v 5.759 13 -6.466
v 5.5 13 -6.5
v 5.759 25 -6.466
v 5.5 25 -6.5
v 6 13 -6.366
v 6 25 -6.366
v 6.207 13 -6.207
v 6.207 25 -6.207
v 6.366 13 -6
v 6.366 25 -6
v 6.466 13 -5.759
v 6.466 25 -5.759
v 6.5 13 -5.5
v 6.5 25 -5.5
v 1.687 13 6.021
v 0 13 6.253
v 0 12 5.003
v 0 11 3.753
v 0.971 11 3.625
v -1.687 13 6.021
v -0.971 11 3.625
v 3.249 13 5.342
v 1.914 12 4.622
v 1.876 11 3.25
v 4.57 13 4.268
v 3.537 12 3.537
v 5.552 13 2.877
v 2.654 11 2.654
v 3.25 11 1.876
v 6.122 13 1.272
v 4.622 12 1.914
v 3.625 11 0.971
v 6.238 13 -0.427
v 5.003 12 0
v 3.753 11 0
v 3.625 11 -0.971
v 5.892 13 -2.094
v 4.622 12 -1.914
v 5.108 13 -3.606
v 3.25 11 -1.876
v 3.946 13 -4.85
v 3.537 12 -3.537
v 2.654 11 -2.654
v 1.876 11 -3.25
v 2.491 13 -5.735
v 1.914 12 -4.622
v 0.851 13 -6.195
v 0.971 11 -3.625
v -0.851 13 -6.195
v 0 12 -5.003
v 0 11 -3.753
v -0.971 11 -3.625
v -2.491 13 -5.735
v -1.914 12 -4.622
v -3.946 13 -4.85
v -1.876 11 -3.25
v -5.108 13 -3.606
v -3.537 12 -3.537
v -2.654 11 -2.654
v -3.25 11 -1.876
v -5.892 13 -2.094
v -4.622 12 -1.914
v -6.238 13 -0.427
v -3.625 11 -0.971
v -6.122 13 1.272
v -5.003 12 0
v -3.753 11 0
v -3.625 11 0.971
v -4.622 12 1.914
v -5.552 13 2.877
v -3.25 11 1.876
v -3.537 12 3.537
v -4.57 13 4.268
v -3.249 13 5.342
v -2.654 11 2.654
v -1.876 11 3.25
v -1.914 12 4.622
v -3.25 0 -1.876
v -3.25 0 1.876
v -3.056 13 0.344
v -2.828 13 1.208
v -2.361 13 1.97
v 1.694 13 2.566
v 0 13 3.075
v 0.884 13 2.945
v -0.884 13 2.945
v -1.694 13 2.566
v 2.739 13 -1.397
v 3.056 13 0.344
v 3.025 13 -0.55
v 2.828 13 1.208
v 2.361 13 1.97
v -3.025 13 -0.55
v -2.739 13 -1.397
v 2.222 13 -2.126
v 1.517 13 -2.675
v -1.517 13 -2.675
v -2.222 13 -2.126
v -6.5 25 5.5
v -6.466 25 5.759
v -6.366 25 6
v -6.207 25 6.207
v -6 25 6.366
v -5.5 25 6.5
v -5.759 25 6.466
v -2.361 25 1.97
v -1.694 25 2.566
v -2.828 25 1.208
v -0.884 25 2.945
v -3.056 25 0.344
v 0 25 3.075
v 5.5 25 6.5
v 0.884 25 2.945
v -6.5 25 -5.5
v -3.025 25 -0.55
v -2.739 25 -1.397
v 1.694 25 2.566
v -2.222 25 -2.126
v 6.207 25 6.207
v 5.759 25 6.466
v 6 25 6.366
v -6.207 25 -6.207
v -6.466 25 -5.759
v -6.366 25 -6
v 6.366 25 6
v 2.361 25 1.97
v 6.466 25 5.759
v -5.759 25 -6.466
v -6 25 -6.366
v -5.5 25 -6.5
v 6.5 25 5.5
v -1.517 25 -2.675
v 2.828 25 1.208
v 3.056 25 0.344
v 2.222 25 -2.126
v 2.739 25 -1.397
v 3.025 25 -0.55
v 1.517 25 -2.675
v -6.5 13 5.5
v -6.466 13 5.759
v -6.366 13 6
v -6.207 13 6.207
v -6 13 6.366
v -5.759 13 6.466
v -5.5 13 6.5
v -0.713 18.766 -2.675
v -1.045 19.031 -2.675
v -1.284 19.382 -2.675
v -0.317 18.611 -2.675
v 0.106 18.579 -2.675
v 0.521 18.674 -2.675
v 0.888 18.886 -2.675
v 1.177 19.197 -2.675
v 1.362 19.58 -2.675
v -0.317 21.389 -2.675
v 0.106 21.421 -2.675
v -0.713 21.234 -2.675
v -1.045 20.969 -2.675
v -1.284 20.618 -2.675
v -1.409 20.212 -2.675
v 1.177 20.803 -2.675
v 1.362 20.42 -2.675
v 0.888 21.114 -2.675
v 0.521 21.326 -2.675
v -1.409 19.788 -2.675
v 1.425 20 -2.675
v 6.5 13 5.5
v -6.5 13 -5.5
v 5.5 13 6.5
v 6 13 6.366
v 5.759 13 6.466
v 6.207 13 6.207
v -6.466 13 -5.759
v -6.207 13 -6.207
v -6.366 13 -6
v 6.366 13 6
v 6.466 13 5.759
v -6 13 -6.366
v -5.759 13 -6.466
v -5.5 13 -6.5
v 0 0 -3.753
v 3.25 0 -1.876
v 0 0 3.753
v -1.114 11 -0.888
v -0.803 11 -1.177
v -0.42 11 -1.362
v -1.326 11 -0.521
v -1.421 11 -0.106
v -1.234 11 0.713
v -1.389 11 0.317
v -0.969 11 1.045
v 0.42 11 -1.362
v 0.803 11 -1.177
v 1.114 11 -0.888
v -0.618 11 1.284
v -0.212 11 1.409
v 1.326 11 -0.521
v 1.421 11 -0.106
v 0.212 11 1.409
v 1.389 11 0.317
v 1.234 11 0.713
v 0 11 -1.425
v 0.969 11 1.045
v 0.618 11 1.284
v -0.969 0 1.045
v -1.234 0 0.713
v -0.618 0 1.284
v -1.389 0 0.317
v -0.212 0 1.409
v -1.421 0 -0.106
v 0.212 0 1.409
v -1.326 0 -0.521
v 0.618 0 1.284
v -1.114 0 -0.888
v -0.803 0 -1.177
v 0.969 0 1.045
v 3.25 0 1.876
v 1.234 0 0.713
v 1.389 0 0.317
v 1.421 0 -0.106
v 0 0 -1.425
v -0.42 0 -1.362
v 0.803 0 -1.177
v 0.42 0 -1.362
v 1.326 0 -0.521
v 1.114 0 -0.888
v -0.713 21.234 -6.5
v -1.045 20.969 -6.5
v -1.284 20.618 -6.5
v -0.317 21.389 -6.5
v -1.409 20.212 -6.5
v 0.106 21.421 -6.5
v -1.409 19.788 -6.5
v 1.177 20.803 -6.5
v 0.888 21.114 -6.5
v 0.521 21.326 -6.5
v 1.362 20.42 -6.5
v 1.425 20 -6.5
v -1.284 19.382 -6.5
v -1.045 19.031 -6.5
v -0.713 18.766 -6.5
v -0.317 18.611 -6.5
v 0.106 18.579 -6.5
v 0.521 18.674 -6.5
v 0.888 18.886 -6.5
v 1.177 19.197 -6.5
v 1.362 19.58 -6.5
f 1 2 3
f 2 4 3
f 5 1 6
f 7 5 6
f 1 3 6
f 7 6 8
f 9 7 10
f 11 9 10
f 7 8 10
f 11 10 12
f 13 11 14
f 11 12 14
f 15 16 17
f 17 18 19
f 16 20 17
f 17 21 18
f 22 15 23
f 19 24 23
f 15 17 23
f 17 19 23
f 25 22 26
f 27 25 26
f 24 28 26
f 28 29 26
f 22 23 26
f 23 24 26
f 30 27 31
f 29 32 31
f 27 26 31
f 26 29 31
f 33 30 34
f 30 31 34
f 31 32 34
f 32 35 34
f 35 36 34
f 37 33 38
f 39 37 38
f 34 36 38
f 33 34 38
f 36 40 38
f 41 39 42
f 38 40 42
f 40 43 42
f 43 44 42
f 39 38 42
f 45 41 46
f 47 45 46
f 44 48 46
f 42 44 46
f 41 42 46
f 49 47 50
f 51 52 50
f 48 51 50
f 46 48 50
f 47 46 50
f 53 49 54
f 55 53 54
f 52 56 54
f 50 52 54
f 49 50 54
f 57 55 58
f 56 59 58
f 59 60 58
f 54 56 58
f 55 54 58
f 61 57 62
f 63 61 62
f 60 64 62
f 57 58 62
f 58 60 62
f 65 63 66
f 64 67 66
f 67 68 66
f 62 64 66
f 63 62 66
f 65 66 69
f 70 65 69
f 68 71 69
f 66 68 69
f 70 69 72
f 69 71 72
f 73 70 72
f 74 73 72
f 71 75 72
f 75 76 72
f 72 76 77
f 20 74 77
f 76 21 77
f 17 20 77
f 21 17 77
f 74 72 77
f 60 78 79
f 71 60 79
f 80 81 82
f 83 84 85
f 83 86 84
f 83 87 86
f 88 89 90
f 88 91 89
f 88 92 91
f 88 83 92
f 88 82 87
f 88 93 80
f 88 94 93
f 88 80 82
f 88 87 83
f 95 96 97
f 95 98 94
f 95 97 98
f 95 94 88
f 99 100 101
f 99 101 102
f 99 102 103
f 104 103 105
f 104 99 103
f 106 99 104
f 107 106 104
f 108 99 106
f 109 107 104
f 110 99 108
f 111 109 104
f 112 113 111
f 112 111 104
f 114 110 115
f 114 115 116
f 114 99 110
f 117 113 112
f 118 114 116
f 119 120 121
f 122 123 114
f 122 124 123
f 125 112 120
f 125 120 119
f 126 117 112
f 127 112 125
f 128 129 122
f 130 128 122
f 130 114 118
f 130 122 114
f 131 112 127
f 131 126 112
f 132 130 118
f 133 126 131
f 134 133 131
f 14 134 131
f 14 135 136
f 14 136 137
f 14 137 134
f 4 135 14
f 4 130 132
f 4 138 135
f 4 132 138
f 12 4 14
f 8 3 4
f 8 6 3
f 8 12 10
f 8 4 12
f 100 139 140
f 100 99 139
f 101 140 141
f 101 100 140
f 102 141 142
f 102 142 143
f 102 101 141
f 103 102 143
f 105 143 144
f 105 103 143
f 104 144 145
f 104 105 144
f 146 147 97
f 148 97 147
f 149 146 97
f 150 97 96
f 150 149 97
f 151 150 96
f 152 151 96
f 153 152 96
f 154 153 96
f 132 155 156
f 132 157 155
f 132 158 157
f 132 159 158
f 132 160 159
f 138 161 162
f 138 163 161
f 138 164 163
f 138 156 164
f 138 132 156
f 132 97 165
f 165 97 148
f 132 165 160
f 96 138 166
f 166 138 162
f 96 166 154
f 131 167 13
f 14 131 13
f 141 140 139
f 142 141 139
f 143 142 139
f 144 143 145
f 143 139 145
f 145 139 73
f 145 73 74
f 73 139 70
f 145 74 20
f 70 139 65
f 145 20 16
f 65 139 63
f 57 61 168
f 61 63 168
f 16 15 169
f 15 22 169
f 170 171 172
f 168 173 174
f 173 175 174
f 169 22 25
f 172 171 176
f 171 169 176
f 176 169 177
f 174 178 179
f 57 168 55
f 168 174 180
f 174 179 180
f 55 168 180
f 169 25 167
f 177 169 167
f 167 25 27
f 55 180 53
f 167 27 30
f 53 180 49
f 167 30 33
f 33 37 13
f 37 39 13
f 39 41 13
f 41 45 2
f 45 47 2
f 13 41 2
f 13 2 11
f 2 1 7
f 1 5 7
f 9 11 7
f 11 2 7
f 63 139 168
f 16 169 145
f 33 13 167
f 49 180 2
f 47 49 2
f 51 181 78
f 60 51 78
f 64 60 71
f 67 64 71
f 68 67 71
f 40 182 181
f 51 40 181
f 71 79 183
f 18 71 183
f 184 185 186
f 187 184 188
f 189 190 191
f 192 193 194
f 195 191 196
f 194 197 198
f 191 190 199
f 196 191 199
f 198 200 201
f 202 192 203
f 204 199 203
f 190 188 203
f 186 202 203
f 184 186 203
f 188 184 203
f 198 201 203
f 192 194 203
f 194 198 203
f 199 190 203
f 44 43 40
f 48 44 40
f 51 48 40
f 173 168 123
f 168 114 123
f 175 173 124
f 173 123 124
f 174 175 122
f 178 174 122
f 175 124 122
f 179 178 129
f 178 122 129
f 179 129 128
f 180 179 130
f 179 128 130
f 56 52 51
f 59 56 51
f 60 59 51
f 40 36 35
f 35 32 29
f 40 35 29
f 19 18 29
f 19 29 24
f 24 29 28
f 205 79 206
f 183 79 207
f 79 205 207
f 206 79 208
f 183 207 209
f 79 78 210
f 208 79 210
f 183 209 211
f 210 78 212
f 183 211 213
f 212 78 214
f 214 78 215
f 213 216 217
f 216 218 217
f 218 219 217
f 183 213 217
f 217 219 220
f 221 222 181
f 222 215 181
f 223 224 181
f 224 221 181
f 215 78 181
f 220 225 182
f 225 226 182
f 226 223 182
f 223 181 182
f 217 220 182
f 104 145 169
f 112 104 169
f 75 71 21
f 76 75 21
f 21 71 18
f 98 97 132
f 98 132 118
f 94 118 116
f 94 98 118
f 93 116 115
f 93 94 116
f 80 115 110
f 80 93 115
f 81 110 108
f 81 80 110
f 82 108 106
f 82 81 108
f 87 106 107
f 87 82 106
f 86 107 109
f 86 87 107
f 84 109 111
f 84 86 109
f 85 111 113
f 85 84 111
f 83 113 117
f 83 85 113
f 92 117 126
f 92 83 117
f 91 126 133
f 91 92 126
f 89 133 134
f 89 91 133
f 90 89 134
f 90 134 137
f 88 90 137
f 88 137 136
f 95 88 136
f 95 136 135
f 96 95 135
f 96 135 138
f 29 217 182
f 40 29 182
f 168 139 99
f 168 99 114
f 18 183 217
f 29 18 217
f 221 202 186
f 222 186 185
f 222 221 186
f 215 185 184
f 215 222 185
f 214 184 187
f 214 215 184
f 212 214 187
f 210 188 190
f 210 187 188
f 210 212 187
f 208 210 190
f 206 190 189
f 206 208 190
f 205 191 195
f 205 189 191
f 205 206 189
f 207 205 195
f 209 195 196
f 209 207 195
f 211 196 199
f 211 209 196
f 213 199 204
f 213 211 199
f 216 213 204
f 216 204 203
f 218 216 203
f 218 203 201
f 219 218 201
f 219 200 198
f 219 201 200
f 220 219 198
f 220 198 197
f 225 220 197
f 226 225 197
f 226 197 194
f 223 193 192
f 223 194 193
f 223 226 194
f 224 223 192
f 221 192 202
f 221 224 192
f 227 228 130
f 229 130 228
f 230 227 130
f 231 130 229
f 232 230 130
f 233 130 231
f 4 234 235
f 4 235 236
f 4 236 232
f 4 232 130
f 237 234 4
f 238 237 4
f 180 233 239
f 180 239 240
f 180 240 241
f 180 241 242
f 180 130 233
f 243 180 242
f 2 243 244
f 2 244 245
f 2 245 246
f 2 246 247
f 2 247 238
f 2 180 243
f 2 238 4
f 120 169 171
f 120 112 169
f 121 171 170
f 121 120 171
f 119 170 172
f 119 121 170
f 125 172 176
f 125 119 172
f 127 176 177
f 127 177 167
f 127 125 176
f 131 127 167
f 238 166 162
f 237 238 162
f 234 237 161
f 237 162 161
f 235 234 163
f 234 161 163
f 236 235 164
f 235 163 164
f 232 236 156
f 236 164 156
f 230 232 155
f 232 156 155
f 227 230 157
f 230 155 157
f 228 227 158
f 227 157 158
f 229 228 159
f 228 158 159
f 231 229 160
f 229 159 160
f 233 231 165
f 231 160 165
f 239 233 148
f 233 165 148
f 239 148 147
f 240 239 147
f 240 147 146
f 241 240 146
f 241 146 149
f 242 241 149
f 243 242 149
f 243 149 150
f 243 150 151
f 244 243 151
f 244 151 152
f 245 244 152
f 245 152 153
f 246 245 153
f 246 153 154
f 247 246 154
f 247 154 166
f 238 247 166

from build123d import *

# Parameters (mm, degrees)
SKETCH1_R           = 1.425
BOSS_EXTRUDE1_DEPTH = 13
SKETCH2_W           = 13
SKETCH2_H           = 13
SKETCH2_R           = 3.075
BOSS_EXTRUDE2_DEPTH = 12
BOSS_EXTRUDE3_REACH = 28.636
SKETCH5_R           = 1.425
CUT_EXTRUDE1_DEPTH  = 12
FILLET2_R           = 1


with BuildPart() as part:
    # Sketch1 → Boss-Extrude1 (new body)
    with BuildSketch(Plane(origin=(0, 0, 0), x_dir=(1, 0, 0), z_dir=(0, 1, 0))):
        Polygon((0, -3.75277675), (3.25, -1.876388375), (3.25, 1.876388375), (0, 3.75277675), (-3.25, 1.876388375), (-3.25, -1.876388375), align=None)
        with Locations(Location((0, 0, 0), (0, 0, 90))):
            Circle(SKETCH1_R, mode=Mode.SUBTRACT)
    extrude(amount=BOSS_EXTRUDE1_DEPTH)

    # Sketch2 → Boss-Extrude2 (add)
    with BuildSketch(Plane(origin=(0, 13, 0), x_dir=(1, 0, 0), z_dir=(0, 1, 0))):
        Rectangle(SKETCH2_W, SKETCH2_H)
        with Locations(Location((0, 0, 0), (0, 0, 270))):
            Circle(SKETCH2_R, mode=Mode.SUBTRACT)
    extrude(amount=BOSS_EXTRUDE2_DEPTH)

    # Sketch3 → Boss-Extrude3 (add, up to next)
    with BuildSketch(Plane(origin=(0, 25, 0), x_dir=(1, 0, 0), z_dir=(0, 1, 0)), mode=Mode.PRIVATE) as boss_extrude3_sk1:
        with BuildLine():
            Line((-1.516575089, 2.675), (1.516575089, 2.675))
            ThreePointArc((1.516575089, 2.675), (0, 3.075), (-1.516575089, 2.675))
        make_face()
    boss_extrude3_tool1 = extrude(boss_extrude3_sk1.sketch, amount=-BOSS_EXTRUDE3_REACH, mode=Mode.PRIVATE) - part.part
    add(boss_extrude3_tool1.solids().sort_by_distance((0, 25, -2.835927))[0])

    # Sketch5 → Cut-Extrude1 (cut)
    with BuildSketch(Plane.XY.offset(-2.675)):
        with Locations((0, 20)):
            Circle(SKETCH5_R)
    extrude(amount=-CUT_EXTRUDE1_DEPTH, mode=Mode.SUBTRACT)

    # Fillet2
    fillet2_edges = [part.edges().sort_by_distance(p)[0] for p in [
        (-6.5, 19, -6.5),
        (-6.5, 19, 6.5),
        (6.5, 19, 6.5),
        (6.5, 19, -6.5),
    ]]
    fillet(fillet2_edges, radius=FILLET2_R)

    # Sketch8 → Revolve1 (revolve)
    with BuildSketch(Plane(origin=(0, 0, 0), x_dir=(0, 0, -1), z_dir=(1, 0, 0))):
        Polygon((0, 13), (-3.75277675, 13), (-6.25277675, 13), (-3.75277675, 11), (0, 11), align=None)
    revolve(axis=Axis((0, -1000, 0), (0, 1, 0)))


solid = part.part
